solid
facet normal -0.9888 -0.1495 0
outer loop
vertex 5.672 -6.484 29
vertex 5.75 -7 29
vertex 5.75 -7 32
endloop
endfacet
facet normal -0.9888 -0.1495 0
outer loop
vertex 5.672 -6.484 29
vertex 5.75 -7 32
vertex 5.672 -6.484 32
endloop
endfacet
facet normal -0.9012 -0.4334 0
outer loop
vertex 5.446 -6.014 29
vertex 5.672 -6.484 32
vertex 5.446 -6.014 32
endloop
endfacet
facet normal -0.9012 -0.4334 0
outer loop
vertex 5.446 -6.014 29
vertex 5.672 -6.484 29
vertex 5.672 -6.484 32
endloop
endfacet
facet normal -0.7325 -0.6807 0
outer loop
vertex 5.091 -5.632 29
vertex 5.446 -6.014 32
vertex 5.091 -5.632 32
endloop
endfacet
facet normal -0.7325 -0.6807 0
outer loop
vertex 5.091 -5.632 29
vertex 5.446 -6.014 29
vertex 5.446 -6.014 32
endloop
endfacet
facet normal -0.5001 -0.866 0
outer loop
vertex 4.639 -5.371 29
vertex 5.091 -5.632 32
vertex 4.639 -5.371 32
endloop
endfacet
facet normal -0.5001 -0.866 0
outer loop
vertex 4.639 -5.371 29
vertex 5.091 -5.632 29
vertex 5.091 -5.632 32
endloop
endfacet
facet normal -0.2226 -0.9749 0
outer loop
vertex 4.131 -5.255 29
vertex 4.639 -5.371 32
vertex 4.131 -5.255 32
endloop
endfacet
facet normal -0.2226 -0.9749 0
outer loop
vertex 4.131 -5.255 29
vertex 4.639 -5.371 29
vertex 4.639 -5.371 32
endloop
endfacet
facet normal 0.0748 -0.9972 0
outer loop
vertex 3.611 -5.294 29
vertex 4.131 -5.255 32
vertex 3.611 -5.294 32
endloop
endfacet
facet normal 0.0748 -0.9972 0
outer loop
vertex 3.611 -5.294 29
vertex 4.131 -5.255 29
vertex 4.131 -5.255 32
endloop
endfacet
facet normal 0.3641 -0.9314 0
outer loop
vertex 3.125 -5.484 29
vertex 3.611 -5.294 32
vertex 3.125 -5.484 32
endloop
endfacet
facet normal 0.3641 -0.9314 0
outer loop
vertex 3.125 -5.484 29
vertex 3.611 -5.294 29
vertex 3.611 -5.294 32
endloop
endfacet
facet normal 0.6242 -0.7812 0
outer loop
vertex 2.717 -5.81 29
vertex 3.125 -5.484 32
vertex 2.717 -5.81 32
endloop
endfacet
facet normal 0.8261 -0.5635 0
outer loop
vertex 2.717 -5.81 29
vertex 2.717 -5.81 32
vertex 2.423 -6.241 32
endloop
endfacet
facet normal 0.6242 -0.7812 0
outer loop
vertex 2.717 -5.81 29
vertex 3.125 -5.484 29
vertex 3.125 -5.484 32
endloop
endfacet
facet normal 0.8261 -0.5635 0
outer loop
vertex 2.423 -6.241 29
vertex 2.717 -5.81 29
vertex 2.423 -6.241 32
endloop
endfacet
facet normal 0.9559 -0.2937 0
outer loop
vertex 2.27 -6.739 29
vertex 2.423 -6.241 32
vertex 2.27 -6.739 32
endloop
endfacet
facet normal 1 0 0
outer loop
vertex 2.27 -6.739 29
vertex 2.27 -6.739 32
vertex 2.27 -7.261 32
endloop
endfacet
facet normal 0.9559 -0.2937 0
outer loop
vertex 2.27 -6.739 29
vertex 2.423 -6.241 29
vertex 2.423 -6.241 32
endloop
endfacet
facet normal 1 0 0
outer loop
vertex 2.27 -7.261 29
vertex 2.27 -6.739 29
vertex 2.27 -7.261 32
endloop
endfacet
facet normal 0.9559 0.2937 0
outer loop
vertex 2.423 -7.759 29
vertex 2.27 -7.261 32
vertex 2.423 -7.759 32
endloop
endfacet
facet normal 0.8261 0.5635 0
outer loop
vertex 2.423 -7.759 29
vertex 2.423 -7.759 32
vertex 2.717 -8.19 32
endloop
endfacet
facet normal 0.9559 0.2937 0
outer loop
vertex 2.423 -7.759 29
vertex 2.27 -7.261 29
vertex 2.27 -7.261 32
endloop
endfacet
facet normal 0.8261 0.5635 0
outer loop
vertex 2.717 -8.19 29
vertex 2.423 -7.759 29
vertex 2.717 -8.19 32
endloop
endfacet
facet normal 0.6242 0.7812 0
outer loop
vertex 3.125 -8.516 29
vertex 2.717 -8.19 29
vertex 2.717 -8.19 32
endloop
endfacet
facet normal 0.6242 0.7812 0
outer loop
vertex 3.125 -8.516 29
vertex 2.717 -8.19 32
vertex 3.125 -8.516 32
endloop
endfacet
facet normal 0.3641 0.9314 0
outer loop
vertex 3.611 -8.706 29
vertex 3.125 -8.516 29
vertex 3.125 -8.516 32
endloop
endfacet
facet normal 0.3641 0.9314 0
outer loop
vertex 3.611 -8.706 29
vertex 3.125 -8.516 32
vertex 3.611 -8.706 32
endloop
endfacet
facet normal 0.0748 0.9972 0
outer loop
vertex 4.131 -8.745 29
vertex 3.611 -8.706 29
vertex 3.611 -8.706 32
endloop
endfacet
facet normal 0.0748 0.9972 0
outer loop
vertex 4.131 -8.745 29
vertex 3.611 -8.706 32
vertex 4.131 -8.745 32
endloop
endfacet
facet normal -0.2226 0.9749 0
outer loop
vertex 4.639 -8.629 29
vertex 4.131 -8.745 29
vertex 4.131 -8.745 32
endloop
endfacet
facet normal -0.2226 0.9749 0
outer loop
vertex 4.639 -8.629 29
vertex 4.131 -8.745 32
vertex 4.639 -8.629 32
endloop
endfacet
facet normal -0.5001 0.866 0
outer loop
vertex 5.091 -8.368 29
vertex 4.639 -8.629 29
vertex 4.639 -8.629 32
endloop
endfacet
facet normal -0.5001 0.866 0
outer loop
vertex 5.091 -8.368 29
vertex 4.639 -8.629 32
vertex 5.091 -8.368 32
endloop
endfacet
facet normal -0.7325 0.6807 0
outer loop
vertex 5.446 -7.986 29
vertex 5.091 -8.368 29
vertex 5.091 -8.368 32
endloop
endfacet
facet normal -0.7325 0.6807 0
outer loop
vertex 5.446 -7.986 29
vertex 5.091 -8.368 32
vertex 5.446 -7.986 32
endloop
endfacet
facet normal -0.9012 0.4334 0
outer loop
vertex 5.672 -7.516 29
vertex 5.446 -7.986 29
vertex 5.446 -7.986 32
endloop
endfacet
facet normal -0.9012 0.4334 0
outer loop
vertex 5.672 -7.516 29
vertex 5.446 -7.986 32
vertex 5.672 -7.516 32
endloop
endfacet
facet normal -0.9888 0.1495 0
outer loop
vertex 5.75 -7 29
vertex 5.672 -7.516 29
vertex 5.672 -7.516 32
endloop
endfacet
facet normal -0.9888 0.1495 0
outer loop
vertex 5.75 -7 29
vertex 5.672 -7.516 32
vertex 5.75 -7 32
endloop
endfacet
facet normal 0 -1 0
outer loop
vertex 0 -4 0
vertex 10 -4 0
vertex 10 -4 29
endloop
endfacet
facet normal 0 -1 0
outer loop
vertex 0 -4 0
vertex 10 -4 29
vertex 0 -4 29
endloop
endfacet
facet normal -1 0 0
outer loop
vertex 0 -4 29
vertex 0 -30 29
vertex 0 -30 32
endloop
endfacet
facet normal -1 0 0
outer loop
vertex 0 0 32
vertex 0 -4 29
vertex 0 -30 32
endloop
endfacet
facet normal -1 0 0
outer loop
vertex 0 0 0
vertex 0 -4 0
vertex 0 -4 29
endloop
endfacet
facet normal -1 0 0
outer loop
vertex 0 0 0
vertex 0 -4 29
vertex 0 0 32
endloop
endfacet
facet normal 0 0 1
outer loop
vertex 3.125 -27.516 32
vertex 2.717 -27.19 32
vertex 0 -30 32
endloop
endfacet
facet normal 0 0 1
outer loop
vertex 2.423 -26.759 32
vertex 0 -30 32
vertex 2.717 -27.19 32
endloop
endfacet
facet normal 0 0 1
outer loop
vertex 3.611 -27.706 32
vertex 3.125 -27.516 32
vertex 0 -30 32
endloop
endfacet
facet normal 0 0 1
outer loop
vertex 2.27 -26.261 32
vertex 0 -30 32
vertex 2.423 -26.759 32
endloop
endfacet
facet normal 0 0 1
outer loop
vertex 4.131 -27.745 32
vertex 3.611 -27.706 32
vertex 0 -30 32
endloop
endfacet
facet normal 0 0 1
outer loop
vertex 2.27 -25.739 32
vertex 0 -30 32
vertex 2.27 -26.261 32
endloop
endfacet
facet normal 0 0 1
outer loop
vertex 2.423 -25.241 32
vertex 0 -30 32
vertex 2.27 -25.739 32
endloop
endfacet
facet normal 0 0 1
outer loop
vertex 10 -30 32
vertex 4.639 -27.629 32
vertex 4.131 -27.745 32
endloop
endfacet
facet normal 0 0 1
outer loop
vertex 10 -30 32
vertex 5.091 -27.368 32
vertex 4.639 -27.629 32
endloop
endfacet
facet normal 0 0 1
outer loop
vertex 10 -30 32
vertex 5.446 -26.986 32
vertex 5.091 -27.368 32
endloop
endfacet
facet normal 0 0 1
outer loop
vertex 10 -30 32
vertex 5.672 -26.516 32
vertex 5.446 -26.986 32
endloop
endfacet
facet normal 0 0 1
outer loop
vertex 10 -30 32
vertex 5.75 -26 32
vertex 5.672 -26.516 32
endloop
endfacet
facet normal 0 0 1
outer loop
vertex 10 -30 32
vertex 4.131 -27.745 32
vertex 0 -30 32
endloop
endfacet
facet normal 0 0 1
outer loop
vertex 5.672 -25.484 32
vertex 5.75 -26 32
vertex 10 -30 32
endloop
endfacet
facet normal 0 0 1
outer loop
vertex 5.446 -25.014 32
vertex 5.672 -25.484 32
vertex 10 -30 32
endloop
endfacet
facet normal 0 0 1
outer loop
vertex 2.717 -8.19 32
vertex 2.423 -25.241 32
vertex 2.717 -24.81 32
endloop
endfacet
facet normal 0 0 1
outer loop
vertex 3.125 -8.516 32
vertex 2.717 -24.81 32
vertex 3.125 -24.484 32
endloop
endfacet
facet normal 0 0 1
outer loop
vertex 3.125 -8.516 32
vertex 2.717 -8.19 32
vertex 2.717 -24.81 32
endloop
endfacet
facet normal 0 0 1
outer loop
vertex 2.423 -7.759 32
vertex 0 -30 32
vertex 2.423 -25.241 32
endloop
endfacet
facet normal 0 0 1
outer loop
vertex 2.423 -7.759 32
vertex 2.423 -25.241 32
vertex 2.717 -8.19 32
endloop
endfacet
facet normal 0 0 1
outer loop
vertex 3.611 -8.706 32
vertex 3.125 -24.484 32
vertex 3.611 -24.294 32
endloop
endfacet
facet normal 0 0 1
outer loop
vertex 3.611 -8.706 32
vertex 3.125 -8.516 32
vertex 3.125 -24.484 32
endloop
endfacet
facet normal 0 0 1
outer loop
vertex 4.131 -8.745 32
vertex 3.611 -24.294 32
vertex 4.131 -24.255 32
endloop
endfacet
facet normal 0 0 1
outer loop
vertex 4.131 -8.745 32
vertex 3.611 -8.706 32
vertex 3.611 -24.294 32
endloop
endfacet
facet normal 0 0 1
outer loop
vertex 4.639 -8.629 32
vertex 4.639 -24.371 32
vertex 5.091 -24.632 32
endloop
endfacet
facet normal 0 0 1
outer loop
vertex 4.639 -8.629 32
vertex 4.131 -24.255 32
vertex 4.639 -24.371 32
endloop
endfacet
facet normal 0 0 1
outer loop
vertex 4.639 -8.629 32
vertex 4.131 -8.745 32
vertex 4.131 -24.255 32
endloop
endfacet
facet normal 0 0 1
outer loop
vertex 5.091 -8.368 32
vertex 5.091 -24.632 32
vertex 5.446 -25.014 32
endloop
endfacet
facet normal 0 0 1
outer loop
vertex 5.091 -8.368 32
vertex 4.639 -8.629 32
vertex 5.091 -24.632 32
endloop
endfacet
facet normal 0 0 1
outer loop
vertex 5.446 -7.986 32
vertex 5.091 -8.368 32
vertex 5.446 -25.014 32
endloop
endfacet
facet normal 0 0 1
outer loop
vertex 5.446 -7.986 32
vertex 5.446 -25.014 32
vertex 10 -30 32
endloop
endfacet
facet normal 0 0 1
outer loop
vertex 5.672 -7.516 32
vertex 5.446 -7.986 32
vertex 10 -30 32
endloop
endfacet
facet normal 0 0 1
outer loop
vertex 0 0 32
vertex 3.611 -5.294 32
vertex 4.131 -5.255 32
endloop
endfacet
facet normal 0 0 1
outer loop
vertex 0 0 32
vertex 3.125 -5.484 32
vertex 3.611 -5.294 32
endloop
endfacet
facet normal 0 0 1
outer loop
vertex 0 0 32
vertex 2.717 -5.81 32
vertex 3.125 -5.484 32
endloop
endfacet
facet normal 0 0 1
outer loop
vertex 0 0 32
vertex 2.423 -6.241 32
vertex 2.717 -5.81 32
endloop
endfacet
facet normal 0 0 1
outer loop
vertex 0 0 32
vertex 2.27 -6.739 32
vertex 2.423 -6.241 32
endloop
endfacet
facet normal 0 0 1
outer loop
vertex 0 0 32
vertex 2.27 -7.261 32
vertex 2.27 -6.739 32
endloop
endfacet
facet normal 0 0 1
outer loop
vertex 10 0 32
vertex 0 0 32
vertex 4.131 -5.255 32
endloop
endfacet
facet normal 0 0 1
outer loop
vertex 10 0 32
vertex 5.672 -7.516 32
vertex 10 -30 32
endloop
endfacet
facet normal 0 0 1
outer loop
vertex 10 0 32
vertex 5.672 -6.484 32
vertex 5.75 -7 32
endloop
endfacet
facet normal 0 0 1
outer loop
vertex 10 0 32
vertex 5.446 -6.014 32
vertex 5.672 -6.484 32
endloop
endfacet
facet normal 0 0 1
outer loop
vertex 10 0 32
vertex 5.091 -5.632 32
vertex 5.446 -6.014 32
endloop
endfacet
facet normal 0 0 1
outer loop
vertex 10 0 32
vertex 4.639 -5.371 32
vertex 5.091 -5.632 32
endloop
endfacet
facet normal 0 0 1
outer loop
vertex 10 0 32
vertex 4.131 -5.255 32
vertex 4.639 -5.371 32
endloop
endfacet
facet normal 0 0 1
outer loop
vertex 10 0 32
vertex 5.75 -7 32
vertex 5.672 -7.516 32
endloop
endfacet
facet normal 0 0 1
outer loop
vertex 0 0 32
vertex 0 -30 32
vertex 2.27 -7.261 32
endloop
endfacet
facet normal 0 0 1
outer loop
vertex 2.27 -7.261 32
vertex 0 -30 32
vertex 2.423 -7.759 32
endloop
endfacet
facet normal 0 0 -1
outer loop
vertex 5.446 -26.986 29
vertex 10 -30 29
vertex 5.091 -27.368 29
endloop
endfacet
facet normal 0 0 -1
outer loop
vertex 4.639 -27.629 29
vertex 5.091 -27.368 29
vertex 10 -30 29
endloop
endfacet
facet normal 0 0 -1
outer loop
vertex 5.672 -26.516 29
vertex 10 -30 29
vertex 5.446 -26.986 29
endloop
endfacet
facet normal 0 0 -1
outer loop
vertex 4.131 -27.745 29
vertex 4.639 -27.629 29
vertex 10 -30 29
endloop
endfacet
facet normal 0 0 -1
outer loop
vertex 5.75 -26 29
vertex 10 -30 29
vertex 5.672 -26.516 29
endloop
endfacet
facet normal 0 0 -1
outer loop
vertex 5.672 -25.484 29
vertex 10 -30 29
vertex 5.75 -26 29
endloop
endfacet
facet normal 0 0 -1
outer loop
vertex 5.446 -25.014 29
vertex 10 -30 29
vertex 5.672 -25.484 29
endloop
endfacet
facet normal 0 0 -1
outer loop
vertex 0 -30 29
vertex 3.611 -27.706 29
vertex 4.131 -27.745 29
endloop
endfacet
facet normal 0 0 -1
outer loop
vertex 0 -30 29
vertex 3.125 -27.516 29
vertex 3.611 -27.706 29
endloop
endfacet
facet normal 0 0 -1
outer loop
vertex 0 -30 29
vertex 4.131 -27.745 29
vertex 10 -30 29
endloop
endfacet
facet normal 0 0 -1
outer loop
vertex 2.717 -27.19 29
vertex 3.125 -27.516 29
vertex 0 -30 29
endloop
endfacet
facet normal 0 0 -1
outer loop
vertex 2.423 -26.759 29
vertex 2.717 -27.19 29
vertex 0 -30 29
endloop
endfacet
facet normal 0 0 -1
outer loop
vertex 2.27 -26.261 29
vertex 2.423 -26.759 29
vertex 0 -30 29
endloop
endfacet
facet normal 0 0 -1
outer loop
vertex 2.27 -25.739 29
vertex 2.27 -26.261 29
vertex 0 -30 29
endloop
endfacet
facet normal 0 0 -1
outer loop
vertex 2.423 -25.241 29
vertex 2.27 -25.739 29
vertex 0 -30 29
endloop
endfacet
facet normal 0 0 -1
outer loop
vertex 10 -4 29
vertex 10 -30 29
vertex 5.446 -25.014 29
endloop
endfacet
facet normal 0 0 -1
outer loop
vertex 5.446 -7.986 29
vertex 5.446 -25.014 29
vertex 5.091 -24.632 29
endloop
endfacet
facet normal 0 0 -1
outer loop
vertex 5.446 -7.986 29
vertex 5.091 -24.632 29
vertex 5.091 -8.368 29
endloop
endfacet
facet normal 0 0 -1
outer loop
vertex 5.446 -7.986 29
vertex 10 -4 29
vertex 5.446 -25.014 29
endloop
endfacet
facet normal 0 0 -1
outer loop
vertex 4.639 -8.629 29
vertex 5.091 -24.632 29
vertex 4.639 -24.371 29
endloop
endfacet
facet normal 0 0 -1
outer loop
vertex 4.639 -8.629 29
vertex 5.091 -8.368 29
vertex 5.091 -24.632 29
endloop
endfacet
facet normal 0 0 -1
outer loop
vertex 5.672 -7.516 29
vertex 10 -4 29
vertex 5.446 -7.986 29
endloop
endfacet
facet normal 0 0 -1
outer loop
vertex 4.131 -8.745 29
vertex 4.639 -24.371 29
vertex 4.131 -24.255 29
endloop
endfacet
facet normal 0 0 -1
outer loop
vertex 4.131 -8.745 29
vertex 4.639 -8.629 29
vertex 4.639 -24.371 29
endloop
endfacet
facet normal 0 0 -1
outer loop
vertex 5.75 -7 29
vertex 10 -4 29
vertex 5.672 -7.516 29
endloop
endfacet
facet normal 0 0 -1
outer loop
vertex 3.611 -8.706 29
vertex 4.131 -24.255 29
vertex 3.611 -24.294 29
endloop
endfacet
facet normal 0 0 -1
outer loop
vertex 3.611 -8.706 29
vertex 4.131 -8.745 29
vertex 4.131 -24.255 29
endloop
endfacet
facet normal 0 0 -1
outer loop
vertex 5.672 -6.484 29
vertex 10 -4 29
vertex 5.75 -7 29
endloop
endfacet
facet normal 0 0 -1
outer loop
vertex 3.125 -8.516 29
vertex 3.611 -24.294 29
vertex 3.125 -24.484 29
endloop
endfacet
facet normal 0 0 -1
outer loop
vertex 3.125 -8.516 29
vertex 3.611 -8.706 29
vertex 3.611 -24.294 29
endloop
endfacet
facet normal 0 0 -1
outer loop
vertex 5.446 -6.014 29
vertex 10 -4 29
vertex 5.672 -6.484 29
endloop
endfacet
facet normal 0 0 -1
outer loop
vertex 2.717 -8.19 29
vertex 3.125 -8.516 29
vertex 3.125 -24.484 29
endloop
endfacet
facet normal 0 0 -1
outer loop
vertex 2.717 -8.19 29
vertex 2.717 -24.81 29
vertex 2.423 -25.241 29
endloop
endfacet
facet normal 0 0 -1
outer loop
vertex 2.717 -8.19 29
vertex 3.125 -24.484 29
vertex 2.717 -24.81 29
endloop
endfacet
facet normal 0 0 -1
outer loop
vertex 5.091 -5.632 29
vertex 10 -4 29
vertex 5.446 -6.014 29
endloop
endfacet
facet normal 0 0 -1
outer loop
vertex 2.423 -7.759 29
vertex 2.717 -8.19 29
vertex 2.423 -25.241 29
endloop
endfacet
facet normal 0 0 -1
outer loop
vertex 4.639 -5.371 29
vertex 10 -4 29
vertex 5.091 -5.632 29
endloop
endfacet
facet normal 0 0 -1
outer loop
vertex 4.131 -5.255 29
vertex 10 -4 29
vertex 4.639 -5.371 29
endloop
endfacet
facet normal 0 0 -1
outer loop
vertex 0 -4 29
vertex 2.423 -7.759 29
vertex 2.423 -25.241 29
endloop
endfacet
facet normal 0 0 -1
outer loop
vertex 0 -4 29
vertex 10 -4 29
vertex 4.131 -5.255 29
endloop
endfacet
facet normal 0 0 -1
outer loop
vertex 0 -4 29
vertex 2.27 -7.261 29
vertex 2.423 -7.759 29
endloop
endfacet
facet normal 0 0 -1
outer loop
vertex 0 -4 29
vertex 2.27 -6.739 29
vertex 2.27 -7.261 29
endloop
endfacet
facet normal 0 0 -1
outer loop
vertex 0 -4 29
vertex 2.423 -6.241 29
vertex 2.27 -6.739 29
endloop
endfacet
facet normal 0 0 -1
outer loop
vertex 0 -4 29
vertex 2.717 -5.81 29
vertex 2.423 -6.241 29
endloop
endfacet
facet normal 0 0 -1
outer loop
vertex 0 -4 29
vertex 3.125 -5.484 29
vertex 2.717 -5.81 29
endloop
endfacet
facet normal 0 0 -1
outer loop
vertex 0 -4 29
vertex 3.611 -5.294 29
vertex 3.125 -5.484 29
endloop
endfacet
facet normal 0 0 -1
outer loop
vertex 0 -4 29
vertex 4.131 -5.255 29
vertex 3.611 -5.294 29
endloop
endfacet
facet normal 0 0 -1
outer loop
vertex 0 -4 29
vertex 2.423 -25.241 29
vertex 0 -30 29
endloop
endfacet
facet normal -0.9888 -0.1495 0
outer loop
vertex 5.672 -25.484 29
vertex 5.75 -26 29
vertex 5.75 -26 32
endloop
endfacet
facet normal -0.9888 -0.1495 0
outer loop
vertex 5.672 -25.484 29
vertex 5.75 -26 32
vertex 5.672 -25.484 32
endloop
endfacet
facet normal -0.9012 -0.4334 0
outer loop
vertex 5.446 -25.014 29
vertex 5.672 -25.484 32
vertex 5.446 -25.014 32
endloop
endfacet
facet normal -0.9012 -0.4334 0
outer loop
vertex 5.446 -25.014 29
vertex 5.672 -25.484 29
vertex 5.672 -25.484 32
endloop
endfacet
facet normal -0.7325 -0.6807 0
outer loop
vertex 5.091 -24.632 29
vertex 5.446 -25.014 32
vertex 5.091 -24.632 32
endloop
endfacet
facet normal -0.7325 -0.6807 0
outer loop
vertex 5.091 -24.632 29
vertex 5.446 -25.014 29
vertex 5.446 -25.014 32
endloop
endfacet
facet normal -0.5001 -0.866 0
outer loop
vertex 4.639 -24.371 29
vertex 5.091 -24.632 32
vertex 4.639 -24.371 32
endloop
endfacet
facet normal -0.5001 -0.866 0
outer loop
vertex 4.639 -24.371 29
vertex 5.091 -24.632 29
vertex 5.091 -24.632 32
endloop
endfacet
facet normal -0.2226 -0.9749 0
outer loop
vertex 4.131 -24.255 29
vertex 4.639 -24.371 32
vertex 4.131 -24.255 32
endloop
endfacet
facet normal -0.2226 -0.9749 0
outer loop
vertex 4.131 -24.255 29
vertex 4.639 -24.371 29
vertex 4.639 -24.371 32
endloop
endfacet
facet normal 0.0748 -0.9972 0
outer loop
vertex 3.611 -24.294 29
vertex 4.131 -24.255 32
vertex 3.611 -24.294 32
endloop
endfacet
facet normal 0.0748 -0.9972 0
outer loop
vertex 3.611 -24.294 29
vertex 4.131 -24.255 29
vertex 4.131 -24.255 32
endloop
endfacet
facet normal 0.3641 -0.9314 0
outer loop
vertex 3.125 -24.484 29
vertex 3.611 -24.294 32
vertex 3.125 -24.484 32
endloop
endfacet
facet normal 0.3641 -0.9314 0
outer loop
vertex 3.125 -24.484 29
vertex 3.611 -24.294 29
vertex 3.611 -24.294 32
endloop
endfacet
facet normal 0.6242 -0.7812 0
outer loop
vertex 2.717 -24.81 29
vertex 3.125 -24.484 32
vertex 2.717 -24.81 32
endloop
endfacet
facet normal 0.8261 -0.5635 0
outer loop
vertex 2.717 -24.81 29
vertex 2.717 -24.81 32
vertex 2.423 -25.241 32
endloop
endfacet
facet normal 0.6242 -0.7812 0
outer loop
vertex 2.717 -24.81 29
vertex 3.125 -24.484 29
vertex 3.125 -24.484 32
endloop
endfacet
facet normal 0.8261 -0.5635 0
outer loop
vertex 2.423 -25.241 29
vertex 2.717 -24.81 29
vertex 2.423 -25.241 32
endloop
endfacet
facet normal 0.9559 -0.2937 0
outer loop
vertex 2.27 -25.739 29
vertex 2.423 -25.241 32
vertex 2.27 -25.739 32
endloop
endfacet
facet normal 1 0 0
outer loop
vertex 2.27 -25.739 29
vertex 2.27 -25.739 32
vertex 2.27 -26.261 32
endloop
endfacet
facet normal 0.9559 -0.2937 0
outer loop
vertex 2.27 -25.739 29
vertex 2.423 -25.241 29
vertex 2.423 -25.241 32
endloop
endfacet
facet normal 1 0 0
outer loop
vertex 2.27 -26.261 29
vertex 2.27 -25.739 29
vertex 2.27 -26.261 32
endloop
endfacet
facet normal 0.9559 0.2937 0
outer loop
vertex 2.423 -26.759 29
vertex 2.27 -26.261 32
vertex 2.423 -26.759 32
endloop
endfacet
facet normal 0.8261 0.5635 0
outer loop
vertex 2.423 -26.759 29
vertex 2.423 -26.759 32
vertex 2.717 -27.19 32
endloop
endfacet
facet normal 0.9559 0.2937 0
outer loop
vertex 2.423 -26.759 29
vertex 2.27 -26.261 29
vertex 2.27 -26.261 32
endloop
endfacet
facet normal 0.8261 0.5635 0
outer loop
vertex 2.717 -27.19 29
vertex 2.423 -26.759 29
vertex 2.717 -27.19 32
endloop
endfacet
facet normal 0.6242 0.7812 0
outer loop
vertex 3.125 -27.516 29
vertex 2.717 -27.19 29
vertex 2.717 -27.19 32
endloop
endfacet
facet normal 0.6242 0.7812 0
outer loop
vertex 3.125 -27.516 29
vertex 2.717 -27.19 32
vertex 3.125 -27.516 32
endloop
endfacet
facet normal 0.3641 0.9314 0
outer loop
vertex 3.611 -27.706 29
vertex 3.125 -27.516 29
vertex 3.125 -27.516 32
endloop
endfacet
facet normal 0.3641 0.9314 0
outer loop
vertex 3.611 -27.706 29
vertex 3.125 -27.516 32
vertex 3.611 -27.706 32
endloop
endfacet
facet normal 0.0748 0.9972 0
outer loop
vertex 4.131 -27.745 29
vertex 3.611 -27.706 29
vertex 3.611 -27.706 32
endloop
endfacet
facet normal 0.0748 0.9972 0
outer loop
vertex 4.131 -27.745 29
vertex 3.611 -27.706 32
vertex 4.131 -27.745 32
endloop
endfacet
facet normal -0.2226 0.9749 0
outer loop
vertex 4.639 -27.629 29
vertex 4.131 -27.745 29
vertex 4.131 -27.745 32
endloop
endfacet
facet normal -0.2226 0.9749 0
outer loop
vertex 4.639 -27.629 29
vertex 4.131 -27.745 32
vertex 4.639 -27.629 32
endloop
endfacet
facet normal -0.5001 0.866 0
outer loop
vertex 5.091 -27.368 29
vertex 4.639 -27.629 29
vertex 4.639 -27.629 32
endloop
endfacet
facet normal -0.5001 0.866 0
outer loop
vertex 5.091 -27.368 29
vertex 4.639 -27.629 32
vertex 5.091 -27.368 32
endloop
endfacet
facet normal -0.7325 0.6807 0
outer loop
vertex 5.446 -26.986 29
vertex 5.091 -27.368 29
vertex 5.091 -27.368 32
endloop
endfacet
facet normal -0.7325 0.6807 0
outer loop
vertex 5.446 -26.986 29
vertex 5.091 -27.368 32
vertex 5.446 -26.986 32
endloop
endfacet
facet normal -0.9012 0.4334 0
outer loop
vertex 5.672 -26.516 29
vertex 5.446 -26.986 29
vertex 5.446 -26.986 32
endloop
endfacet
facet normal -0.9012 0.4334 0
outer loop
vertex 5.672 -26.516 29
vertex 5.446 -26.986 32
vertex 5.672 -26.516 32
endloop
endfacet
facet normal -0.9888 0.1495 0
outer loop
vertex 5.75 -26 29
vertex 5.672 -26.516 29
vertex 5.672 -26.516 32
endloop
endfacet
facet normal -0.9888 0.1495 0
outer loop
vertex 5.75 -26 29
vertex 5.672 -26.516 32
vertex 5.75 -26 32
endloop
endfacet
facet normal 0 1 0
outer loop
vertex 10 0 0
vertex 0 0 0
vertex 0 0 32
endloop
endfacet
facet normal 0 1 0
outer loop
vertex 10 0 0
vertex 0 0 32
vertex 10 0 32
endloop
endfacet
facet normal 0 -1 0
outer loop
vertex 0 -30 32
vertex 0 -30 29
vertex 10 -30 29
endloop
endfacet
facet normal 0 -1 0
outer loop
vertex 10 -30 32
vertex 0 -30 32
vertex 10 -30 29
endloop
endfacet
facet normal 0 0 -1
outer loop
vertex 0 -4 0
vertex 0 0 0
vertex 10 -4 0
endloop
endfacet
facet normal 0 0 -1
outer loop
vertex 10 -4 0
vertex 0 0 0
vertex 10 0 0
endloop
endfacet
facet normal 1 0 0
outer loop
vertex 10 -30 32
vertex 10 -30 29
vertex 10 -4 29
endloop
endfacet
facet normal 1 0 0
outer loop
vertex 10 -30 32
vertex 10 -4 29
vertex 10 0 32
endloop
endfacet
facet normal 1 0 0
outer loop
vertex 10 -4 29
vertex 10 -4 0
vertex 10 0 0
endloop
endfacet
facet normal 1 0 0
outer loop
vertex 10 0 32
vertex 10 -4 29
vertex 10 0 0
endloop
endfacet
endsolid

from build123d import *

# Parameters (mm, degrees)
SKETCH1_W           = 10
SKETCH1_H           = 30
SKETCH1_R           = 1.75
BOSS_EXTRUDE1_DEPTH = 32
SKETCH2_W           = 10
SKETCH2_H           = 26
CUT_EXTRUDE1_DEPTH  = 29


with BuildPart() as part:
    # Sketch1 → Boss-Extrude1 (new body)
    with BuildSketch(Plane.XY):
        with Locations((5, -15)):
            Rectangle(SKETCH1_W, SKETCH1_H)
        with Locations((4, -7)):
            Circle(SKETCH1_R, mode=Mode.SUBTRACT)
        with Locations((4, -26)):
            Circle(SKETCH1_R, mode=Mode.SUBTRACT)
    extrude(amount=BOSS_EXTRUDE1_DEPTH)

    # Sketch2 → Cut-Extrude1 (cut)
    with BuildSketch(Plane(origin=(0, 0, 0), x_dir=(-1, 0, 0), z_dir=(0, 0, -1))):
        with Locations((-5, -17)):
            Rectangle(SKETCH2_W, SKETCH2_H)
    extrude(amount=-CUT_EXTRUDE1_DEPTH, mode=Mode.SUBTRACT)


solid = part.part
